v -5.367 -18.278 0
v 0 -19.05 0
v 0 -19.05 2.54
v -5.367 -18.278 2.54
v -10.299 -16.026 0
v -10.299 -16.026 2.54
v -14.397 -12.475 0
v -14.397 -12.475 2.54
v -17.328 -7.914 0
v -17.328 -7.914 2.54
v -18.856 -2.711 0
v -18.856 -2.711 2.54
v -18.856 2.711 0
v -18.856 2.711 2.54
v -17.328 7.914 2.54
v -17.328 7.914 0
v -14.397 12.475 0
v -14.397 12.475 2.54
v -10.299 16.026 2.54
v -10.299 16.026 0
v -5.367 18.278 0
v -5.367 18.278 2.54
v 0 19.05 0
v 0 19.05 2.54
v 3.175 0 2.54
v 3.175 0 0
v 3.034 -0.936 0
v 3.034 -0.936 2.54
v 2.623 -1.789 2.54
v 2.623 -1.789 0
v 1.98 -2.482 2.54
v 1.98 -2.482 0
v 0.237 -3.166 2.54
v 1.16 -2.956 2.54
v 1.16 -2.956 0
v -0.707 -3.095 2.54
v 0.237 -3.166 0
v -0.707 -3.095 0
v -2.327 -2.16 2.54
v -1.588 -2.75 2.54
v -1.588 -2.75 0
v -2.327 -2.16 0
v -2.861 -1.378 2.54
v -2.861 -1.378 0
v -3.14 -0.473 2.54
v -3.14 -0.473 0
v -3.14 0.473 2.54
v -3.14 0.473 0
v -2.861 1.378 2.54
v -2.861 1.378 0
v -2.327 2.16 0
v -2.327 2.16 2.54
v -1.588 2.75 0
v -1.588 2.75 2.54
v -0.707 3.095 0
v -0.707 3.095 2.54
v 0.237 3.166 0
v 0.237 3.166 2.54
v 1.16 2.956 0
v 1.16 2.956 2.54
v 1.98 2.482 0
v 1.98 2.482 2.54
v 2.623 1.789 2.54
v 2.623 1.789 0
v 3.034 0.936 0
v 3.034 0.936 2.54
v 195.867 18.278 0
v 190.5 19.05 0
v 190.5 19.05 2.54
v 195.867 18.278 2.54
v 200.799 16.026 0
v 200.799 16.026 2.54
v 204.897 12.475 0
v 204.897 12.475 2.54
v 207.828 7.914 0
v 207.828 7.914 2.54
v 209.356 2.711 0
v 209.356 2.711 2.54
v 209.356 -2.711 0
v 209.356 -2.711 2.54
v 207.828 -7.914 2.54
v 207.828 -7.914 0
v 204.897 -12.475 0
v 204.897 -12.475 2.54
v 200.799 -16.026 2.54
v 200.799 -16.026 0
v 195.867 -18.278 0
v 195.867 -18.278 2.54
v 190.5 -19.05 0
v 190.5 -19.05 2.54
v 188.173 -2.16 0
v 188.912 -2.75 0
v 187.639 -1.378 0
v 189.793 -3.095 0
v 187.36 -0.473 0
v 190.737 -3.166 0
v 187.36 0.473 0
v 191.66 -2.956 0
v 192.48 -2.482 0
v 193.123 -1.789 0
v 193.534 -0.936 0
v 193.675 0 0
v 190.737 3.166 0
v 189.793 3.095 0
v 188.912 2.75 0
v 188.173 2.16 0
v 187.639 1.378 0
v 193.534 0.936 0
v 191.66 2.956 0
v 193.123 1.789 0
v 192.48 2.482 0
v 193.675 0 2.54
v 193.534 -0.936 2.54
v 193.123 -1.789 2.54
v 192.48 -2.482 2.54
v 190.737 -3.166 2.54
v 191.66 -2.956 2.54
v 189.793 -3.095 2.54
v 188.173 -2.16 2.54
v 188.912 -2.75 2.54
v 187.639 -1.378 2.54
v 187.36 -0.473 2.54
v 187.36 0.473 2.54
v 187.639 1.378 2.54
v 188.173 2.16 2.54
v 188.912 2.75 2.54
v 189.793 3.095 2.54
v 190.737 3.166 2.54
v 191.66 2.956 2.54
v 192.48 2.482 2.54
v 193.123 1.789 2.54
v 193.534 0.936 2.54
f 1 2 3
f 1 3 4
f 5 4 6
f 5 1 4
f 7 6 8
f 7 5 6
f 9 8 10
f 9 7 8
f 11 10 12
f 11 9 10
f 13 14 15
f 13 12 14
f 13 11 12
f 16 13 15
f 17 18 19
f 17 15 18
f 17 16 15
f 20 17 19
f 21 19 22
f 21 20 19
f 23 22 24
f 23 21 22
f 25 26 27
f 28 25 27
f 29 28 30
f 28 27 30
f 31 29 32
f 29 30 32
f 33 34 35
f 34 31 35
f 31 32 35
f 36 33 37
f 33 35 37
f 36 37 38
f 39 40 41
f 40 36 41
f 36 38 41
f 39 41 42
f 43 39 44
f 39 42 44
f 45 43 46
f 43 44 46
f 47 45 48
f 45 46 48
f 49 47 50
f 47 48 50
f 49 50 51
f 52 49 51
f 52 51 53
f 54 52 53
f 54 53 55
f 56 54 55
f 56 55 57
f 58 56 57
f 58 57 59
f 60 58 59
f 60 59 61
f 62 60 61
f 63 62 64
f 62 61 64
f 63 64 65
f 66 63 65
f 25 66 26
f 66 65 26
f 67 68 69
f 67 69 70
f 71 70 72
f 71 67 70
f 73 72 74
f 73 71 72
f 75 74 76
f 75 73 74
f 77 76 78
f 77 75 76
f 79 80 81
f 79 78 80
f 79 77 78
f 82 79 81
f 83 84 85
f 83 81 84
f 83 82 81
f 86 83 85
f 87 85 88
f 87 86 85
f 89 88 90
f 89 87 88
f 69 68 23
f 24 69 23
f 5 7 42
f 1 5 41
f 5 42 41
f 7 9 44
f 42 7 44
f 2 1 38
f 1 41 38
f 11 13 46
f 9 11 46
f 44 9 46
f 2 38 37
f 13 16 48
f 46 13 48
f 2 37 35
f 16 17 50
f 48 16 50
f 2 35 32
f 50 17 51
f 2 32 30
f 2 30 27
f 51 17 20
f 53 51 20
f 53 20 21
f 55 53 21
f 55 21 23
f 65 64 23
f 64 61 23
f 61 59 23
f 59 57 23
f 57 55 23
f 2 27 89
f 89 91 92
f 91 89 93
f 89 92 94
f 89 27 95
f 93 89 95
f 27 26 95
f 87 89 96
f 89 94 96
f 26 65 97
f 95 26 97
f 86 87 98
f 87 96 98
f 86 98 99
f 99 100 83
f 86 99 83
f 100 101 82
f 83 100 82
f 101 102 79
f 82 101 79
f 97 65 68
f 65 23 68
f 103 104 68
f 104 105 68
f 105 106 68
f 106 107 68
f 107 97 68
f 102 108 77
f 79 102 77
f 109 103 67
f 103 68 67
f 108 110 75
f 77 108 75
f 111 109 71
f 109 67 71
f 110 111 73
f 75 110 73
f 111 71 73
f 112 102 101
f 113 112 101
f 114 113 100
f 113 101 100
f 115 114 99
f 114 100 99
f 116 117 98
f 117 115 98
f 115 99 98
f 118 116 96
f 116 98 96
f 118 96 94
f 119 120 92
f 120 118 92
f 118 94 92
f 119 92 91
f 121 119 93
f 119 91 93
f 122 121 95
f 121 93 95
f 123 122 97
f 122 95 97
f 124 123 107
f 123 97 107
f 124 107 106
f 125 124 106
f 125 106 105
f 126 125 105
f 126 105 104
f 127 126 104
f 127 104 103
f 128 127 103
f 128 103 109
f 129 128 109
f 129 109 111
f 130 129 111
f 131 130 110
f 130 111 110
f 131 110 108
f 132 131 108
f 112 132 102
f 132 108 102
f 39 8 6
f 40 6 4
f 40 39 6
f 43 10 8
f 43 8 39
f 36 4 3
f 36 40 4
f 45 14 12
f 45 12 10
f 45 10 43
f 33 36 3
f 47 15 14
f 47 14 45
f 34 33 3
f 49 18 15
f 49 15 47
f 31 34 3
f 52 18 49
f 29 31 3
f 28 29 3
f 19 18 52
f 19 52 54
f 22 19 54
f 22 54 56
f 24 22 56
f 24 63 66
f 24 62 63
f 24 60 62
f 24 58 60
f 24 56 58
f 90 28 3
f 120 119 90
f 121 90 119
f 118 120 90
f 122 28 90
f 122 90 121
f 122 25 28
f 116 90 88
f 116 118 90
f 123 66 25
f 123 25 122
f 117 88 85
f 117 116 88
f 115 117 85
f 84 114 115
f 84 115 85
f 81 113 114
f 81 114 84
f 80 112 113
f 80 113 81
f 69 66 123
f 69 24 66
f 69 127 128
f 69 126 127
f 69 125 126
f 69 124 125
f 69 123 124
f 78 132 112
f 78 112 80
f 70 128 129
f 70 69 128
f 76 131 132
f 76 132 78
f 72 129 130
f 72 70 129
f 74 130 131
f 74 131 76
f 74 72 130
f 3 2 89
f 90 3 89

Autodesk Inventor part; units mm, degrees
ref_plane "YZ Plane" through (0, 0, 0) normal (1, 0, 0) x (0, 1, 0)
ref_plane "XZ Plane" through (0, 0, 0) normal (0, 1, 0) x (-1, 0, 0)
ref_plane "XY Plane" through (0, 0, 0) normal (0, 0, 1) x (1, 0, 0)
sketch "Sketch1" plane through (0, 0, 0) normal (0, 0, 1) x (1, 0, 0)
  line L0 (0, 0) -> (190.5, 0) construction
  line L1 (0, -19.05) -> (190.5, -19.05)
  line L2 (190.5, 19.05) -> (0, 19.05)
  arc A0 (0, 19.05) -> (0, -19.05) centre (0, 0) ccw
  arc A1 (190.5, -19.05) -> (190.5, 19.05) centre (190.5, 0) ccw
  circle A2 centre (0, 0) radius 3.175
  circle A3 centre (190.5, 0) radius 3.175
  point P0 (95.25, 0)
  dimension "d0" = 190.5
  dimension "d1" = 38.1
  dimension "d2" = 6.35
extrude "Extrusion1" add sketch "Sketch1" along normal blind 2.54
properties part number "link"
